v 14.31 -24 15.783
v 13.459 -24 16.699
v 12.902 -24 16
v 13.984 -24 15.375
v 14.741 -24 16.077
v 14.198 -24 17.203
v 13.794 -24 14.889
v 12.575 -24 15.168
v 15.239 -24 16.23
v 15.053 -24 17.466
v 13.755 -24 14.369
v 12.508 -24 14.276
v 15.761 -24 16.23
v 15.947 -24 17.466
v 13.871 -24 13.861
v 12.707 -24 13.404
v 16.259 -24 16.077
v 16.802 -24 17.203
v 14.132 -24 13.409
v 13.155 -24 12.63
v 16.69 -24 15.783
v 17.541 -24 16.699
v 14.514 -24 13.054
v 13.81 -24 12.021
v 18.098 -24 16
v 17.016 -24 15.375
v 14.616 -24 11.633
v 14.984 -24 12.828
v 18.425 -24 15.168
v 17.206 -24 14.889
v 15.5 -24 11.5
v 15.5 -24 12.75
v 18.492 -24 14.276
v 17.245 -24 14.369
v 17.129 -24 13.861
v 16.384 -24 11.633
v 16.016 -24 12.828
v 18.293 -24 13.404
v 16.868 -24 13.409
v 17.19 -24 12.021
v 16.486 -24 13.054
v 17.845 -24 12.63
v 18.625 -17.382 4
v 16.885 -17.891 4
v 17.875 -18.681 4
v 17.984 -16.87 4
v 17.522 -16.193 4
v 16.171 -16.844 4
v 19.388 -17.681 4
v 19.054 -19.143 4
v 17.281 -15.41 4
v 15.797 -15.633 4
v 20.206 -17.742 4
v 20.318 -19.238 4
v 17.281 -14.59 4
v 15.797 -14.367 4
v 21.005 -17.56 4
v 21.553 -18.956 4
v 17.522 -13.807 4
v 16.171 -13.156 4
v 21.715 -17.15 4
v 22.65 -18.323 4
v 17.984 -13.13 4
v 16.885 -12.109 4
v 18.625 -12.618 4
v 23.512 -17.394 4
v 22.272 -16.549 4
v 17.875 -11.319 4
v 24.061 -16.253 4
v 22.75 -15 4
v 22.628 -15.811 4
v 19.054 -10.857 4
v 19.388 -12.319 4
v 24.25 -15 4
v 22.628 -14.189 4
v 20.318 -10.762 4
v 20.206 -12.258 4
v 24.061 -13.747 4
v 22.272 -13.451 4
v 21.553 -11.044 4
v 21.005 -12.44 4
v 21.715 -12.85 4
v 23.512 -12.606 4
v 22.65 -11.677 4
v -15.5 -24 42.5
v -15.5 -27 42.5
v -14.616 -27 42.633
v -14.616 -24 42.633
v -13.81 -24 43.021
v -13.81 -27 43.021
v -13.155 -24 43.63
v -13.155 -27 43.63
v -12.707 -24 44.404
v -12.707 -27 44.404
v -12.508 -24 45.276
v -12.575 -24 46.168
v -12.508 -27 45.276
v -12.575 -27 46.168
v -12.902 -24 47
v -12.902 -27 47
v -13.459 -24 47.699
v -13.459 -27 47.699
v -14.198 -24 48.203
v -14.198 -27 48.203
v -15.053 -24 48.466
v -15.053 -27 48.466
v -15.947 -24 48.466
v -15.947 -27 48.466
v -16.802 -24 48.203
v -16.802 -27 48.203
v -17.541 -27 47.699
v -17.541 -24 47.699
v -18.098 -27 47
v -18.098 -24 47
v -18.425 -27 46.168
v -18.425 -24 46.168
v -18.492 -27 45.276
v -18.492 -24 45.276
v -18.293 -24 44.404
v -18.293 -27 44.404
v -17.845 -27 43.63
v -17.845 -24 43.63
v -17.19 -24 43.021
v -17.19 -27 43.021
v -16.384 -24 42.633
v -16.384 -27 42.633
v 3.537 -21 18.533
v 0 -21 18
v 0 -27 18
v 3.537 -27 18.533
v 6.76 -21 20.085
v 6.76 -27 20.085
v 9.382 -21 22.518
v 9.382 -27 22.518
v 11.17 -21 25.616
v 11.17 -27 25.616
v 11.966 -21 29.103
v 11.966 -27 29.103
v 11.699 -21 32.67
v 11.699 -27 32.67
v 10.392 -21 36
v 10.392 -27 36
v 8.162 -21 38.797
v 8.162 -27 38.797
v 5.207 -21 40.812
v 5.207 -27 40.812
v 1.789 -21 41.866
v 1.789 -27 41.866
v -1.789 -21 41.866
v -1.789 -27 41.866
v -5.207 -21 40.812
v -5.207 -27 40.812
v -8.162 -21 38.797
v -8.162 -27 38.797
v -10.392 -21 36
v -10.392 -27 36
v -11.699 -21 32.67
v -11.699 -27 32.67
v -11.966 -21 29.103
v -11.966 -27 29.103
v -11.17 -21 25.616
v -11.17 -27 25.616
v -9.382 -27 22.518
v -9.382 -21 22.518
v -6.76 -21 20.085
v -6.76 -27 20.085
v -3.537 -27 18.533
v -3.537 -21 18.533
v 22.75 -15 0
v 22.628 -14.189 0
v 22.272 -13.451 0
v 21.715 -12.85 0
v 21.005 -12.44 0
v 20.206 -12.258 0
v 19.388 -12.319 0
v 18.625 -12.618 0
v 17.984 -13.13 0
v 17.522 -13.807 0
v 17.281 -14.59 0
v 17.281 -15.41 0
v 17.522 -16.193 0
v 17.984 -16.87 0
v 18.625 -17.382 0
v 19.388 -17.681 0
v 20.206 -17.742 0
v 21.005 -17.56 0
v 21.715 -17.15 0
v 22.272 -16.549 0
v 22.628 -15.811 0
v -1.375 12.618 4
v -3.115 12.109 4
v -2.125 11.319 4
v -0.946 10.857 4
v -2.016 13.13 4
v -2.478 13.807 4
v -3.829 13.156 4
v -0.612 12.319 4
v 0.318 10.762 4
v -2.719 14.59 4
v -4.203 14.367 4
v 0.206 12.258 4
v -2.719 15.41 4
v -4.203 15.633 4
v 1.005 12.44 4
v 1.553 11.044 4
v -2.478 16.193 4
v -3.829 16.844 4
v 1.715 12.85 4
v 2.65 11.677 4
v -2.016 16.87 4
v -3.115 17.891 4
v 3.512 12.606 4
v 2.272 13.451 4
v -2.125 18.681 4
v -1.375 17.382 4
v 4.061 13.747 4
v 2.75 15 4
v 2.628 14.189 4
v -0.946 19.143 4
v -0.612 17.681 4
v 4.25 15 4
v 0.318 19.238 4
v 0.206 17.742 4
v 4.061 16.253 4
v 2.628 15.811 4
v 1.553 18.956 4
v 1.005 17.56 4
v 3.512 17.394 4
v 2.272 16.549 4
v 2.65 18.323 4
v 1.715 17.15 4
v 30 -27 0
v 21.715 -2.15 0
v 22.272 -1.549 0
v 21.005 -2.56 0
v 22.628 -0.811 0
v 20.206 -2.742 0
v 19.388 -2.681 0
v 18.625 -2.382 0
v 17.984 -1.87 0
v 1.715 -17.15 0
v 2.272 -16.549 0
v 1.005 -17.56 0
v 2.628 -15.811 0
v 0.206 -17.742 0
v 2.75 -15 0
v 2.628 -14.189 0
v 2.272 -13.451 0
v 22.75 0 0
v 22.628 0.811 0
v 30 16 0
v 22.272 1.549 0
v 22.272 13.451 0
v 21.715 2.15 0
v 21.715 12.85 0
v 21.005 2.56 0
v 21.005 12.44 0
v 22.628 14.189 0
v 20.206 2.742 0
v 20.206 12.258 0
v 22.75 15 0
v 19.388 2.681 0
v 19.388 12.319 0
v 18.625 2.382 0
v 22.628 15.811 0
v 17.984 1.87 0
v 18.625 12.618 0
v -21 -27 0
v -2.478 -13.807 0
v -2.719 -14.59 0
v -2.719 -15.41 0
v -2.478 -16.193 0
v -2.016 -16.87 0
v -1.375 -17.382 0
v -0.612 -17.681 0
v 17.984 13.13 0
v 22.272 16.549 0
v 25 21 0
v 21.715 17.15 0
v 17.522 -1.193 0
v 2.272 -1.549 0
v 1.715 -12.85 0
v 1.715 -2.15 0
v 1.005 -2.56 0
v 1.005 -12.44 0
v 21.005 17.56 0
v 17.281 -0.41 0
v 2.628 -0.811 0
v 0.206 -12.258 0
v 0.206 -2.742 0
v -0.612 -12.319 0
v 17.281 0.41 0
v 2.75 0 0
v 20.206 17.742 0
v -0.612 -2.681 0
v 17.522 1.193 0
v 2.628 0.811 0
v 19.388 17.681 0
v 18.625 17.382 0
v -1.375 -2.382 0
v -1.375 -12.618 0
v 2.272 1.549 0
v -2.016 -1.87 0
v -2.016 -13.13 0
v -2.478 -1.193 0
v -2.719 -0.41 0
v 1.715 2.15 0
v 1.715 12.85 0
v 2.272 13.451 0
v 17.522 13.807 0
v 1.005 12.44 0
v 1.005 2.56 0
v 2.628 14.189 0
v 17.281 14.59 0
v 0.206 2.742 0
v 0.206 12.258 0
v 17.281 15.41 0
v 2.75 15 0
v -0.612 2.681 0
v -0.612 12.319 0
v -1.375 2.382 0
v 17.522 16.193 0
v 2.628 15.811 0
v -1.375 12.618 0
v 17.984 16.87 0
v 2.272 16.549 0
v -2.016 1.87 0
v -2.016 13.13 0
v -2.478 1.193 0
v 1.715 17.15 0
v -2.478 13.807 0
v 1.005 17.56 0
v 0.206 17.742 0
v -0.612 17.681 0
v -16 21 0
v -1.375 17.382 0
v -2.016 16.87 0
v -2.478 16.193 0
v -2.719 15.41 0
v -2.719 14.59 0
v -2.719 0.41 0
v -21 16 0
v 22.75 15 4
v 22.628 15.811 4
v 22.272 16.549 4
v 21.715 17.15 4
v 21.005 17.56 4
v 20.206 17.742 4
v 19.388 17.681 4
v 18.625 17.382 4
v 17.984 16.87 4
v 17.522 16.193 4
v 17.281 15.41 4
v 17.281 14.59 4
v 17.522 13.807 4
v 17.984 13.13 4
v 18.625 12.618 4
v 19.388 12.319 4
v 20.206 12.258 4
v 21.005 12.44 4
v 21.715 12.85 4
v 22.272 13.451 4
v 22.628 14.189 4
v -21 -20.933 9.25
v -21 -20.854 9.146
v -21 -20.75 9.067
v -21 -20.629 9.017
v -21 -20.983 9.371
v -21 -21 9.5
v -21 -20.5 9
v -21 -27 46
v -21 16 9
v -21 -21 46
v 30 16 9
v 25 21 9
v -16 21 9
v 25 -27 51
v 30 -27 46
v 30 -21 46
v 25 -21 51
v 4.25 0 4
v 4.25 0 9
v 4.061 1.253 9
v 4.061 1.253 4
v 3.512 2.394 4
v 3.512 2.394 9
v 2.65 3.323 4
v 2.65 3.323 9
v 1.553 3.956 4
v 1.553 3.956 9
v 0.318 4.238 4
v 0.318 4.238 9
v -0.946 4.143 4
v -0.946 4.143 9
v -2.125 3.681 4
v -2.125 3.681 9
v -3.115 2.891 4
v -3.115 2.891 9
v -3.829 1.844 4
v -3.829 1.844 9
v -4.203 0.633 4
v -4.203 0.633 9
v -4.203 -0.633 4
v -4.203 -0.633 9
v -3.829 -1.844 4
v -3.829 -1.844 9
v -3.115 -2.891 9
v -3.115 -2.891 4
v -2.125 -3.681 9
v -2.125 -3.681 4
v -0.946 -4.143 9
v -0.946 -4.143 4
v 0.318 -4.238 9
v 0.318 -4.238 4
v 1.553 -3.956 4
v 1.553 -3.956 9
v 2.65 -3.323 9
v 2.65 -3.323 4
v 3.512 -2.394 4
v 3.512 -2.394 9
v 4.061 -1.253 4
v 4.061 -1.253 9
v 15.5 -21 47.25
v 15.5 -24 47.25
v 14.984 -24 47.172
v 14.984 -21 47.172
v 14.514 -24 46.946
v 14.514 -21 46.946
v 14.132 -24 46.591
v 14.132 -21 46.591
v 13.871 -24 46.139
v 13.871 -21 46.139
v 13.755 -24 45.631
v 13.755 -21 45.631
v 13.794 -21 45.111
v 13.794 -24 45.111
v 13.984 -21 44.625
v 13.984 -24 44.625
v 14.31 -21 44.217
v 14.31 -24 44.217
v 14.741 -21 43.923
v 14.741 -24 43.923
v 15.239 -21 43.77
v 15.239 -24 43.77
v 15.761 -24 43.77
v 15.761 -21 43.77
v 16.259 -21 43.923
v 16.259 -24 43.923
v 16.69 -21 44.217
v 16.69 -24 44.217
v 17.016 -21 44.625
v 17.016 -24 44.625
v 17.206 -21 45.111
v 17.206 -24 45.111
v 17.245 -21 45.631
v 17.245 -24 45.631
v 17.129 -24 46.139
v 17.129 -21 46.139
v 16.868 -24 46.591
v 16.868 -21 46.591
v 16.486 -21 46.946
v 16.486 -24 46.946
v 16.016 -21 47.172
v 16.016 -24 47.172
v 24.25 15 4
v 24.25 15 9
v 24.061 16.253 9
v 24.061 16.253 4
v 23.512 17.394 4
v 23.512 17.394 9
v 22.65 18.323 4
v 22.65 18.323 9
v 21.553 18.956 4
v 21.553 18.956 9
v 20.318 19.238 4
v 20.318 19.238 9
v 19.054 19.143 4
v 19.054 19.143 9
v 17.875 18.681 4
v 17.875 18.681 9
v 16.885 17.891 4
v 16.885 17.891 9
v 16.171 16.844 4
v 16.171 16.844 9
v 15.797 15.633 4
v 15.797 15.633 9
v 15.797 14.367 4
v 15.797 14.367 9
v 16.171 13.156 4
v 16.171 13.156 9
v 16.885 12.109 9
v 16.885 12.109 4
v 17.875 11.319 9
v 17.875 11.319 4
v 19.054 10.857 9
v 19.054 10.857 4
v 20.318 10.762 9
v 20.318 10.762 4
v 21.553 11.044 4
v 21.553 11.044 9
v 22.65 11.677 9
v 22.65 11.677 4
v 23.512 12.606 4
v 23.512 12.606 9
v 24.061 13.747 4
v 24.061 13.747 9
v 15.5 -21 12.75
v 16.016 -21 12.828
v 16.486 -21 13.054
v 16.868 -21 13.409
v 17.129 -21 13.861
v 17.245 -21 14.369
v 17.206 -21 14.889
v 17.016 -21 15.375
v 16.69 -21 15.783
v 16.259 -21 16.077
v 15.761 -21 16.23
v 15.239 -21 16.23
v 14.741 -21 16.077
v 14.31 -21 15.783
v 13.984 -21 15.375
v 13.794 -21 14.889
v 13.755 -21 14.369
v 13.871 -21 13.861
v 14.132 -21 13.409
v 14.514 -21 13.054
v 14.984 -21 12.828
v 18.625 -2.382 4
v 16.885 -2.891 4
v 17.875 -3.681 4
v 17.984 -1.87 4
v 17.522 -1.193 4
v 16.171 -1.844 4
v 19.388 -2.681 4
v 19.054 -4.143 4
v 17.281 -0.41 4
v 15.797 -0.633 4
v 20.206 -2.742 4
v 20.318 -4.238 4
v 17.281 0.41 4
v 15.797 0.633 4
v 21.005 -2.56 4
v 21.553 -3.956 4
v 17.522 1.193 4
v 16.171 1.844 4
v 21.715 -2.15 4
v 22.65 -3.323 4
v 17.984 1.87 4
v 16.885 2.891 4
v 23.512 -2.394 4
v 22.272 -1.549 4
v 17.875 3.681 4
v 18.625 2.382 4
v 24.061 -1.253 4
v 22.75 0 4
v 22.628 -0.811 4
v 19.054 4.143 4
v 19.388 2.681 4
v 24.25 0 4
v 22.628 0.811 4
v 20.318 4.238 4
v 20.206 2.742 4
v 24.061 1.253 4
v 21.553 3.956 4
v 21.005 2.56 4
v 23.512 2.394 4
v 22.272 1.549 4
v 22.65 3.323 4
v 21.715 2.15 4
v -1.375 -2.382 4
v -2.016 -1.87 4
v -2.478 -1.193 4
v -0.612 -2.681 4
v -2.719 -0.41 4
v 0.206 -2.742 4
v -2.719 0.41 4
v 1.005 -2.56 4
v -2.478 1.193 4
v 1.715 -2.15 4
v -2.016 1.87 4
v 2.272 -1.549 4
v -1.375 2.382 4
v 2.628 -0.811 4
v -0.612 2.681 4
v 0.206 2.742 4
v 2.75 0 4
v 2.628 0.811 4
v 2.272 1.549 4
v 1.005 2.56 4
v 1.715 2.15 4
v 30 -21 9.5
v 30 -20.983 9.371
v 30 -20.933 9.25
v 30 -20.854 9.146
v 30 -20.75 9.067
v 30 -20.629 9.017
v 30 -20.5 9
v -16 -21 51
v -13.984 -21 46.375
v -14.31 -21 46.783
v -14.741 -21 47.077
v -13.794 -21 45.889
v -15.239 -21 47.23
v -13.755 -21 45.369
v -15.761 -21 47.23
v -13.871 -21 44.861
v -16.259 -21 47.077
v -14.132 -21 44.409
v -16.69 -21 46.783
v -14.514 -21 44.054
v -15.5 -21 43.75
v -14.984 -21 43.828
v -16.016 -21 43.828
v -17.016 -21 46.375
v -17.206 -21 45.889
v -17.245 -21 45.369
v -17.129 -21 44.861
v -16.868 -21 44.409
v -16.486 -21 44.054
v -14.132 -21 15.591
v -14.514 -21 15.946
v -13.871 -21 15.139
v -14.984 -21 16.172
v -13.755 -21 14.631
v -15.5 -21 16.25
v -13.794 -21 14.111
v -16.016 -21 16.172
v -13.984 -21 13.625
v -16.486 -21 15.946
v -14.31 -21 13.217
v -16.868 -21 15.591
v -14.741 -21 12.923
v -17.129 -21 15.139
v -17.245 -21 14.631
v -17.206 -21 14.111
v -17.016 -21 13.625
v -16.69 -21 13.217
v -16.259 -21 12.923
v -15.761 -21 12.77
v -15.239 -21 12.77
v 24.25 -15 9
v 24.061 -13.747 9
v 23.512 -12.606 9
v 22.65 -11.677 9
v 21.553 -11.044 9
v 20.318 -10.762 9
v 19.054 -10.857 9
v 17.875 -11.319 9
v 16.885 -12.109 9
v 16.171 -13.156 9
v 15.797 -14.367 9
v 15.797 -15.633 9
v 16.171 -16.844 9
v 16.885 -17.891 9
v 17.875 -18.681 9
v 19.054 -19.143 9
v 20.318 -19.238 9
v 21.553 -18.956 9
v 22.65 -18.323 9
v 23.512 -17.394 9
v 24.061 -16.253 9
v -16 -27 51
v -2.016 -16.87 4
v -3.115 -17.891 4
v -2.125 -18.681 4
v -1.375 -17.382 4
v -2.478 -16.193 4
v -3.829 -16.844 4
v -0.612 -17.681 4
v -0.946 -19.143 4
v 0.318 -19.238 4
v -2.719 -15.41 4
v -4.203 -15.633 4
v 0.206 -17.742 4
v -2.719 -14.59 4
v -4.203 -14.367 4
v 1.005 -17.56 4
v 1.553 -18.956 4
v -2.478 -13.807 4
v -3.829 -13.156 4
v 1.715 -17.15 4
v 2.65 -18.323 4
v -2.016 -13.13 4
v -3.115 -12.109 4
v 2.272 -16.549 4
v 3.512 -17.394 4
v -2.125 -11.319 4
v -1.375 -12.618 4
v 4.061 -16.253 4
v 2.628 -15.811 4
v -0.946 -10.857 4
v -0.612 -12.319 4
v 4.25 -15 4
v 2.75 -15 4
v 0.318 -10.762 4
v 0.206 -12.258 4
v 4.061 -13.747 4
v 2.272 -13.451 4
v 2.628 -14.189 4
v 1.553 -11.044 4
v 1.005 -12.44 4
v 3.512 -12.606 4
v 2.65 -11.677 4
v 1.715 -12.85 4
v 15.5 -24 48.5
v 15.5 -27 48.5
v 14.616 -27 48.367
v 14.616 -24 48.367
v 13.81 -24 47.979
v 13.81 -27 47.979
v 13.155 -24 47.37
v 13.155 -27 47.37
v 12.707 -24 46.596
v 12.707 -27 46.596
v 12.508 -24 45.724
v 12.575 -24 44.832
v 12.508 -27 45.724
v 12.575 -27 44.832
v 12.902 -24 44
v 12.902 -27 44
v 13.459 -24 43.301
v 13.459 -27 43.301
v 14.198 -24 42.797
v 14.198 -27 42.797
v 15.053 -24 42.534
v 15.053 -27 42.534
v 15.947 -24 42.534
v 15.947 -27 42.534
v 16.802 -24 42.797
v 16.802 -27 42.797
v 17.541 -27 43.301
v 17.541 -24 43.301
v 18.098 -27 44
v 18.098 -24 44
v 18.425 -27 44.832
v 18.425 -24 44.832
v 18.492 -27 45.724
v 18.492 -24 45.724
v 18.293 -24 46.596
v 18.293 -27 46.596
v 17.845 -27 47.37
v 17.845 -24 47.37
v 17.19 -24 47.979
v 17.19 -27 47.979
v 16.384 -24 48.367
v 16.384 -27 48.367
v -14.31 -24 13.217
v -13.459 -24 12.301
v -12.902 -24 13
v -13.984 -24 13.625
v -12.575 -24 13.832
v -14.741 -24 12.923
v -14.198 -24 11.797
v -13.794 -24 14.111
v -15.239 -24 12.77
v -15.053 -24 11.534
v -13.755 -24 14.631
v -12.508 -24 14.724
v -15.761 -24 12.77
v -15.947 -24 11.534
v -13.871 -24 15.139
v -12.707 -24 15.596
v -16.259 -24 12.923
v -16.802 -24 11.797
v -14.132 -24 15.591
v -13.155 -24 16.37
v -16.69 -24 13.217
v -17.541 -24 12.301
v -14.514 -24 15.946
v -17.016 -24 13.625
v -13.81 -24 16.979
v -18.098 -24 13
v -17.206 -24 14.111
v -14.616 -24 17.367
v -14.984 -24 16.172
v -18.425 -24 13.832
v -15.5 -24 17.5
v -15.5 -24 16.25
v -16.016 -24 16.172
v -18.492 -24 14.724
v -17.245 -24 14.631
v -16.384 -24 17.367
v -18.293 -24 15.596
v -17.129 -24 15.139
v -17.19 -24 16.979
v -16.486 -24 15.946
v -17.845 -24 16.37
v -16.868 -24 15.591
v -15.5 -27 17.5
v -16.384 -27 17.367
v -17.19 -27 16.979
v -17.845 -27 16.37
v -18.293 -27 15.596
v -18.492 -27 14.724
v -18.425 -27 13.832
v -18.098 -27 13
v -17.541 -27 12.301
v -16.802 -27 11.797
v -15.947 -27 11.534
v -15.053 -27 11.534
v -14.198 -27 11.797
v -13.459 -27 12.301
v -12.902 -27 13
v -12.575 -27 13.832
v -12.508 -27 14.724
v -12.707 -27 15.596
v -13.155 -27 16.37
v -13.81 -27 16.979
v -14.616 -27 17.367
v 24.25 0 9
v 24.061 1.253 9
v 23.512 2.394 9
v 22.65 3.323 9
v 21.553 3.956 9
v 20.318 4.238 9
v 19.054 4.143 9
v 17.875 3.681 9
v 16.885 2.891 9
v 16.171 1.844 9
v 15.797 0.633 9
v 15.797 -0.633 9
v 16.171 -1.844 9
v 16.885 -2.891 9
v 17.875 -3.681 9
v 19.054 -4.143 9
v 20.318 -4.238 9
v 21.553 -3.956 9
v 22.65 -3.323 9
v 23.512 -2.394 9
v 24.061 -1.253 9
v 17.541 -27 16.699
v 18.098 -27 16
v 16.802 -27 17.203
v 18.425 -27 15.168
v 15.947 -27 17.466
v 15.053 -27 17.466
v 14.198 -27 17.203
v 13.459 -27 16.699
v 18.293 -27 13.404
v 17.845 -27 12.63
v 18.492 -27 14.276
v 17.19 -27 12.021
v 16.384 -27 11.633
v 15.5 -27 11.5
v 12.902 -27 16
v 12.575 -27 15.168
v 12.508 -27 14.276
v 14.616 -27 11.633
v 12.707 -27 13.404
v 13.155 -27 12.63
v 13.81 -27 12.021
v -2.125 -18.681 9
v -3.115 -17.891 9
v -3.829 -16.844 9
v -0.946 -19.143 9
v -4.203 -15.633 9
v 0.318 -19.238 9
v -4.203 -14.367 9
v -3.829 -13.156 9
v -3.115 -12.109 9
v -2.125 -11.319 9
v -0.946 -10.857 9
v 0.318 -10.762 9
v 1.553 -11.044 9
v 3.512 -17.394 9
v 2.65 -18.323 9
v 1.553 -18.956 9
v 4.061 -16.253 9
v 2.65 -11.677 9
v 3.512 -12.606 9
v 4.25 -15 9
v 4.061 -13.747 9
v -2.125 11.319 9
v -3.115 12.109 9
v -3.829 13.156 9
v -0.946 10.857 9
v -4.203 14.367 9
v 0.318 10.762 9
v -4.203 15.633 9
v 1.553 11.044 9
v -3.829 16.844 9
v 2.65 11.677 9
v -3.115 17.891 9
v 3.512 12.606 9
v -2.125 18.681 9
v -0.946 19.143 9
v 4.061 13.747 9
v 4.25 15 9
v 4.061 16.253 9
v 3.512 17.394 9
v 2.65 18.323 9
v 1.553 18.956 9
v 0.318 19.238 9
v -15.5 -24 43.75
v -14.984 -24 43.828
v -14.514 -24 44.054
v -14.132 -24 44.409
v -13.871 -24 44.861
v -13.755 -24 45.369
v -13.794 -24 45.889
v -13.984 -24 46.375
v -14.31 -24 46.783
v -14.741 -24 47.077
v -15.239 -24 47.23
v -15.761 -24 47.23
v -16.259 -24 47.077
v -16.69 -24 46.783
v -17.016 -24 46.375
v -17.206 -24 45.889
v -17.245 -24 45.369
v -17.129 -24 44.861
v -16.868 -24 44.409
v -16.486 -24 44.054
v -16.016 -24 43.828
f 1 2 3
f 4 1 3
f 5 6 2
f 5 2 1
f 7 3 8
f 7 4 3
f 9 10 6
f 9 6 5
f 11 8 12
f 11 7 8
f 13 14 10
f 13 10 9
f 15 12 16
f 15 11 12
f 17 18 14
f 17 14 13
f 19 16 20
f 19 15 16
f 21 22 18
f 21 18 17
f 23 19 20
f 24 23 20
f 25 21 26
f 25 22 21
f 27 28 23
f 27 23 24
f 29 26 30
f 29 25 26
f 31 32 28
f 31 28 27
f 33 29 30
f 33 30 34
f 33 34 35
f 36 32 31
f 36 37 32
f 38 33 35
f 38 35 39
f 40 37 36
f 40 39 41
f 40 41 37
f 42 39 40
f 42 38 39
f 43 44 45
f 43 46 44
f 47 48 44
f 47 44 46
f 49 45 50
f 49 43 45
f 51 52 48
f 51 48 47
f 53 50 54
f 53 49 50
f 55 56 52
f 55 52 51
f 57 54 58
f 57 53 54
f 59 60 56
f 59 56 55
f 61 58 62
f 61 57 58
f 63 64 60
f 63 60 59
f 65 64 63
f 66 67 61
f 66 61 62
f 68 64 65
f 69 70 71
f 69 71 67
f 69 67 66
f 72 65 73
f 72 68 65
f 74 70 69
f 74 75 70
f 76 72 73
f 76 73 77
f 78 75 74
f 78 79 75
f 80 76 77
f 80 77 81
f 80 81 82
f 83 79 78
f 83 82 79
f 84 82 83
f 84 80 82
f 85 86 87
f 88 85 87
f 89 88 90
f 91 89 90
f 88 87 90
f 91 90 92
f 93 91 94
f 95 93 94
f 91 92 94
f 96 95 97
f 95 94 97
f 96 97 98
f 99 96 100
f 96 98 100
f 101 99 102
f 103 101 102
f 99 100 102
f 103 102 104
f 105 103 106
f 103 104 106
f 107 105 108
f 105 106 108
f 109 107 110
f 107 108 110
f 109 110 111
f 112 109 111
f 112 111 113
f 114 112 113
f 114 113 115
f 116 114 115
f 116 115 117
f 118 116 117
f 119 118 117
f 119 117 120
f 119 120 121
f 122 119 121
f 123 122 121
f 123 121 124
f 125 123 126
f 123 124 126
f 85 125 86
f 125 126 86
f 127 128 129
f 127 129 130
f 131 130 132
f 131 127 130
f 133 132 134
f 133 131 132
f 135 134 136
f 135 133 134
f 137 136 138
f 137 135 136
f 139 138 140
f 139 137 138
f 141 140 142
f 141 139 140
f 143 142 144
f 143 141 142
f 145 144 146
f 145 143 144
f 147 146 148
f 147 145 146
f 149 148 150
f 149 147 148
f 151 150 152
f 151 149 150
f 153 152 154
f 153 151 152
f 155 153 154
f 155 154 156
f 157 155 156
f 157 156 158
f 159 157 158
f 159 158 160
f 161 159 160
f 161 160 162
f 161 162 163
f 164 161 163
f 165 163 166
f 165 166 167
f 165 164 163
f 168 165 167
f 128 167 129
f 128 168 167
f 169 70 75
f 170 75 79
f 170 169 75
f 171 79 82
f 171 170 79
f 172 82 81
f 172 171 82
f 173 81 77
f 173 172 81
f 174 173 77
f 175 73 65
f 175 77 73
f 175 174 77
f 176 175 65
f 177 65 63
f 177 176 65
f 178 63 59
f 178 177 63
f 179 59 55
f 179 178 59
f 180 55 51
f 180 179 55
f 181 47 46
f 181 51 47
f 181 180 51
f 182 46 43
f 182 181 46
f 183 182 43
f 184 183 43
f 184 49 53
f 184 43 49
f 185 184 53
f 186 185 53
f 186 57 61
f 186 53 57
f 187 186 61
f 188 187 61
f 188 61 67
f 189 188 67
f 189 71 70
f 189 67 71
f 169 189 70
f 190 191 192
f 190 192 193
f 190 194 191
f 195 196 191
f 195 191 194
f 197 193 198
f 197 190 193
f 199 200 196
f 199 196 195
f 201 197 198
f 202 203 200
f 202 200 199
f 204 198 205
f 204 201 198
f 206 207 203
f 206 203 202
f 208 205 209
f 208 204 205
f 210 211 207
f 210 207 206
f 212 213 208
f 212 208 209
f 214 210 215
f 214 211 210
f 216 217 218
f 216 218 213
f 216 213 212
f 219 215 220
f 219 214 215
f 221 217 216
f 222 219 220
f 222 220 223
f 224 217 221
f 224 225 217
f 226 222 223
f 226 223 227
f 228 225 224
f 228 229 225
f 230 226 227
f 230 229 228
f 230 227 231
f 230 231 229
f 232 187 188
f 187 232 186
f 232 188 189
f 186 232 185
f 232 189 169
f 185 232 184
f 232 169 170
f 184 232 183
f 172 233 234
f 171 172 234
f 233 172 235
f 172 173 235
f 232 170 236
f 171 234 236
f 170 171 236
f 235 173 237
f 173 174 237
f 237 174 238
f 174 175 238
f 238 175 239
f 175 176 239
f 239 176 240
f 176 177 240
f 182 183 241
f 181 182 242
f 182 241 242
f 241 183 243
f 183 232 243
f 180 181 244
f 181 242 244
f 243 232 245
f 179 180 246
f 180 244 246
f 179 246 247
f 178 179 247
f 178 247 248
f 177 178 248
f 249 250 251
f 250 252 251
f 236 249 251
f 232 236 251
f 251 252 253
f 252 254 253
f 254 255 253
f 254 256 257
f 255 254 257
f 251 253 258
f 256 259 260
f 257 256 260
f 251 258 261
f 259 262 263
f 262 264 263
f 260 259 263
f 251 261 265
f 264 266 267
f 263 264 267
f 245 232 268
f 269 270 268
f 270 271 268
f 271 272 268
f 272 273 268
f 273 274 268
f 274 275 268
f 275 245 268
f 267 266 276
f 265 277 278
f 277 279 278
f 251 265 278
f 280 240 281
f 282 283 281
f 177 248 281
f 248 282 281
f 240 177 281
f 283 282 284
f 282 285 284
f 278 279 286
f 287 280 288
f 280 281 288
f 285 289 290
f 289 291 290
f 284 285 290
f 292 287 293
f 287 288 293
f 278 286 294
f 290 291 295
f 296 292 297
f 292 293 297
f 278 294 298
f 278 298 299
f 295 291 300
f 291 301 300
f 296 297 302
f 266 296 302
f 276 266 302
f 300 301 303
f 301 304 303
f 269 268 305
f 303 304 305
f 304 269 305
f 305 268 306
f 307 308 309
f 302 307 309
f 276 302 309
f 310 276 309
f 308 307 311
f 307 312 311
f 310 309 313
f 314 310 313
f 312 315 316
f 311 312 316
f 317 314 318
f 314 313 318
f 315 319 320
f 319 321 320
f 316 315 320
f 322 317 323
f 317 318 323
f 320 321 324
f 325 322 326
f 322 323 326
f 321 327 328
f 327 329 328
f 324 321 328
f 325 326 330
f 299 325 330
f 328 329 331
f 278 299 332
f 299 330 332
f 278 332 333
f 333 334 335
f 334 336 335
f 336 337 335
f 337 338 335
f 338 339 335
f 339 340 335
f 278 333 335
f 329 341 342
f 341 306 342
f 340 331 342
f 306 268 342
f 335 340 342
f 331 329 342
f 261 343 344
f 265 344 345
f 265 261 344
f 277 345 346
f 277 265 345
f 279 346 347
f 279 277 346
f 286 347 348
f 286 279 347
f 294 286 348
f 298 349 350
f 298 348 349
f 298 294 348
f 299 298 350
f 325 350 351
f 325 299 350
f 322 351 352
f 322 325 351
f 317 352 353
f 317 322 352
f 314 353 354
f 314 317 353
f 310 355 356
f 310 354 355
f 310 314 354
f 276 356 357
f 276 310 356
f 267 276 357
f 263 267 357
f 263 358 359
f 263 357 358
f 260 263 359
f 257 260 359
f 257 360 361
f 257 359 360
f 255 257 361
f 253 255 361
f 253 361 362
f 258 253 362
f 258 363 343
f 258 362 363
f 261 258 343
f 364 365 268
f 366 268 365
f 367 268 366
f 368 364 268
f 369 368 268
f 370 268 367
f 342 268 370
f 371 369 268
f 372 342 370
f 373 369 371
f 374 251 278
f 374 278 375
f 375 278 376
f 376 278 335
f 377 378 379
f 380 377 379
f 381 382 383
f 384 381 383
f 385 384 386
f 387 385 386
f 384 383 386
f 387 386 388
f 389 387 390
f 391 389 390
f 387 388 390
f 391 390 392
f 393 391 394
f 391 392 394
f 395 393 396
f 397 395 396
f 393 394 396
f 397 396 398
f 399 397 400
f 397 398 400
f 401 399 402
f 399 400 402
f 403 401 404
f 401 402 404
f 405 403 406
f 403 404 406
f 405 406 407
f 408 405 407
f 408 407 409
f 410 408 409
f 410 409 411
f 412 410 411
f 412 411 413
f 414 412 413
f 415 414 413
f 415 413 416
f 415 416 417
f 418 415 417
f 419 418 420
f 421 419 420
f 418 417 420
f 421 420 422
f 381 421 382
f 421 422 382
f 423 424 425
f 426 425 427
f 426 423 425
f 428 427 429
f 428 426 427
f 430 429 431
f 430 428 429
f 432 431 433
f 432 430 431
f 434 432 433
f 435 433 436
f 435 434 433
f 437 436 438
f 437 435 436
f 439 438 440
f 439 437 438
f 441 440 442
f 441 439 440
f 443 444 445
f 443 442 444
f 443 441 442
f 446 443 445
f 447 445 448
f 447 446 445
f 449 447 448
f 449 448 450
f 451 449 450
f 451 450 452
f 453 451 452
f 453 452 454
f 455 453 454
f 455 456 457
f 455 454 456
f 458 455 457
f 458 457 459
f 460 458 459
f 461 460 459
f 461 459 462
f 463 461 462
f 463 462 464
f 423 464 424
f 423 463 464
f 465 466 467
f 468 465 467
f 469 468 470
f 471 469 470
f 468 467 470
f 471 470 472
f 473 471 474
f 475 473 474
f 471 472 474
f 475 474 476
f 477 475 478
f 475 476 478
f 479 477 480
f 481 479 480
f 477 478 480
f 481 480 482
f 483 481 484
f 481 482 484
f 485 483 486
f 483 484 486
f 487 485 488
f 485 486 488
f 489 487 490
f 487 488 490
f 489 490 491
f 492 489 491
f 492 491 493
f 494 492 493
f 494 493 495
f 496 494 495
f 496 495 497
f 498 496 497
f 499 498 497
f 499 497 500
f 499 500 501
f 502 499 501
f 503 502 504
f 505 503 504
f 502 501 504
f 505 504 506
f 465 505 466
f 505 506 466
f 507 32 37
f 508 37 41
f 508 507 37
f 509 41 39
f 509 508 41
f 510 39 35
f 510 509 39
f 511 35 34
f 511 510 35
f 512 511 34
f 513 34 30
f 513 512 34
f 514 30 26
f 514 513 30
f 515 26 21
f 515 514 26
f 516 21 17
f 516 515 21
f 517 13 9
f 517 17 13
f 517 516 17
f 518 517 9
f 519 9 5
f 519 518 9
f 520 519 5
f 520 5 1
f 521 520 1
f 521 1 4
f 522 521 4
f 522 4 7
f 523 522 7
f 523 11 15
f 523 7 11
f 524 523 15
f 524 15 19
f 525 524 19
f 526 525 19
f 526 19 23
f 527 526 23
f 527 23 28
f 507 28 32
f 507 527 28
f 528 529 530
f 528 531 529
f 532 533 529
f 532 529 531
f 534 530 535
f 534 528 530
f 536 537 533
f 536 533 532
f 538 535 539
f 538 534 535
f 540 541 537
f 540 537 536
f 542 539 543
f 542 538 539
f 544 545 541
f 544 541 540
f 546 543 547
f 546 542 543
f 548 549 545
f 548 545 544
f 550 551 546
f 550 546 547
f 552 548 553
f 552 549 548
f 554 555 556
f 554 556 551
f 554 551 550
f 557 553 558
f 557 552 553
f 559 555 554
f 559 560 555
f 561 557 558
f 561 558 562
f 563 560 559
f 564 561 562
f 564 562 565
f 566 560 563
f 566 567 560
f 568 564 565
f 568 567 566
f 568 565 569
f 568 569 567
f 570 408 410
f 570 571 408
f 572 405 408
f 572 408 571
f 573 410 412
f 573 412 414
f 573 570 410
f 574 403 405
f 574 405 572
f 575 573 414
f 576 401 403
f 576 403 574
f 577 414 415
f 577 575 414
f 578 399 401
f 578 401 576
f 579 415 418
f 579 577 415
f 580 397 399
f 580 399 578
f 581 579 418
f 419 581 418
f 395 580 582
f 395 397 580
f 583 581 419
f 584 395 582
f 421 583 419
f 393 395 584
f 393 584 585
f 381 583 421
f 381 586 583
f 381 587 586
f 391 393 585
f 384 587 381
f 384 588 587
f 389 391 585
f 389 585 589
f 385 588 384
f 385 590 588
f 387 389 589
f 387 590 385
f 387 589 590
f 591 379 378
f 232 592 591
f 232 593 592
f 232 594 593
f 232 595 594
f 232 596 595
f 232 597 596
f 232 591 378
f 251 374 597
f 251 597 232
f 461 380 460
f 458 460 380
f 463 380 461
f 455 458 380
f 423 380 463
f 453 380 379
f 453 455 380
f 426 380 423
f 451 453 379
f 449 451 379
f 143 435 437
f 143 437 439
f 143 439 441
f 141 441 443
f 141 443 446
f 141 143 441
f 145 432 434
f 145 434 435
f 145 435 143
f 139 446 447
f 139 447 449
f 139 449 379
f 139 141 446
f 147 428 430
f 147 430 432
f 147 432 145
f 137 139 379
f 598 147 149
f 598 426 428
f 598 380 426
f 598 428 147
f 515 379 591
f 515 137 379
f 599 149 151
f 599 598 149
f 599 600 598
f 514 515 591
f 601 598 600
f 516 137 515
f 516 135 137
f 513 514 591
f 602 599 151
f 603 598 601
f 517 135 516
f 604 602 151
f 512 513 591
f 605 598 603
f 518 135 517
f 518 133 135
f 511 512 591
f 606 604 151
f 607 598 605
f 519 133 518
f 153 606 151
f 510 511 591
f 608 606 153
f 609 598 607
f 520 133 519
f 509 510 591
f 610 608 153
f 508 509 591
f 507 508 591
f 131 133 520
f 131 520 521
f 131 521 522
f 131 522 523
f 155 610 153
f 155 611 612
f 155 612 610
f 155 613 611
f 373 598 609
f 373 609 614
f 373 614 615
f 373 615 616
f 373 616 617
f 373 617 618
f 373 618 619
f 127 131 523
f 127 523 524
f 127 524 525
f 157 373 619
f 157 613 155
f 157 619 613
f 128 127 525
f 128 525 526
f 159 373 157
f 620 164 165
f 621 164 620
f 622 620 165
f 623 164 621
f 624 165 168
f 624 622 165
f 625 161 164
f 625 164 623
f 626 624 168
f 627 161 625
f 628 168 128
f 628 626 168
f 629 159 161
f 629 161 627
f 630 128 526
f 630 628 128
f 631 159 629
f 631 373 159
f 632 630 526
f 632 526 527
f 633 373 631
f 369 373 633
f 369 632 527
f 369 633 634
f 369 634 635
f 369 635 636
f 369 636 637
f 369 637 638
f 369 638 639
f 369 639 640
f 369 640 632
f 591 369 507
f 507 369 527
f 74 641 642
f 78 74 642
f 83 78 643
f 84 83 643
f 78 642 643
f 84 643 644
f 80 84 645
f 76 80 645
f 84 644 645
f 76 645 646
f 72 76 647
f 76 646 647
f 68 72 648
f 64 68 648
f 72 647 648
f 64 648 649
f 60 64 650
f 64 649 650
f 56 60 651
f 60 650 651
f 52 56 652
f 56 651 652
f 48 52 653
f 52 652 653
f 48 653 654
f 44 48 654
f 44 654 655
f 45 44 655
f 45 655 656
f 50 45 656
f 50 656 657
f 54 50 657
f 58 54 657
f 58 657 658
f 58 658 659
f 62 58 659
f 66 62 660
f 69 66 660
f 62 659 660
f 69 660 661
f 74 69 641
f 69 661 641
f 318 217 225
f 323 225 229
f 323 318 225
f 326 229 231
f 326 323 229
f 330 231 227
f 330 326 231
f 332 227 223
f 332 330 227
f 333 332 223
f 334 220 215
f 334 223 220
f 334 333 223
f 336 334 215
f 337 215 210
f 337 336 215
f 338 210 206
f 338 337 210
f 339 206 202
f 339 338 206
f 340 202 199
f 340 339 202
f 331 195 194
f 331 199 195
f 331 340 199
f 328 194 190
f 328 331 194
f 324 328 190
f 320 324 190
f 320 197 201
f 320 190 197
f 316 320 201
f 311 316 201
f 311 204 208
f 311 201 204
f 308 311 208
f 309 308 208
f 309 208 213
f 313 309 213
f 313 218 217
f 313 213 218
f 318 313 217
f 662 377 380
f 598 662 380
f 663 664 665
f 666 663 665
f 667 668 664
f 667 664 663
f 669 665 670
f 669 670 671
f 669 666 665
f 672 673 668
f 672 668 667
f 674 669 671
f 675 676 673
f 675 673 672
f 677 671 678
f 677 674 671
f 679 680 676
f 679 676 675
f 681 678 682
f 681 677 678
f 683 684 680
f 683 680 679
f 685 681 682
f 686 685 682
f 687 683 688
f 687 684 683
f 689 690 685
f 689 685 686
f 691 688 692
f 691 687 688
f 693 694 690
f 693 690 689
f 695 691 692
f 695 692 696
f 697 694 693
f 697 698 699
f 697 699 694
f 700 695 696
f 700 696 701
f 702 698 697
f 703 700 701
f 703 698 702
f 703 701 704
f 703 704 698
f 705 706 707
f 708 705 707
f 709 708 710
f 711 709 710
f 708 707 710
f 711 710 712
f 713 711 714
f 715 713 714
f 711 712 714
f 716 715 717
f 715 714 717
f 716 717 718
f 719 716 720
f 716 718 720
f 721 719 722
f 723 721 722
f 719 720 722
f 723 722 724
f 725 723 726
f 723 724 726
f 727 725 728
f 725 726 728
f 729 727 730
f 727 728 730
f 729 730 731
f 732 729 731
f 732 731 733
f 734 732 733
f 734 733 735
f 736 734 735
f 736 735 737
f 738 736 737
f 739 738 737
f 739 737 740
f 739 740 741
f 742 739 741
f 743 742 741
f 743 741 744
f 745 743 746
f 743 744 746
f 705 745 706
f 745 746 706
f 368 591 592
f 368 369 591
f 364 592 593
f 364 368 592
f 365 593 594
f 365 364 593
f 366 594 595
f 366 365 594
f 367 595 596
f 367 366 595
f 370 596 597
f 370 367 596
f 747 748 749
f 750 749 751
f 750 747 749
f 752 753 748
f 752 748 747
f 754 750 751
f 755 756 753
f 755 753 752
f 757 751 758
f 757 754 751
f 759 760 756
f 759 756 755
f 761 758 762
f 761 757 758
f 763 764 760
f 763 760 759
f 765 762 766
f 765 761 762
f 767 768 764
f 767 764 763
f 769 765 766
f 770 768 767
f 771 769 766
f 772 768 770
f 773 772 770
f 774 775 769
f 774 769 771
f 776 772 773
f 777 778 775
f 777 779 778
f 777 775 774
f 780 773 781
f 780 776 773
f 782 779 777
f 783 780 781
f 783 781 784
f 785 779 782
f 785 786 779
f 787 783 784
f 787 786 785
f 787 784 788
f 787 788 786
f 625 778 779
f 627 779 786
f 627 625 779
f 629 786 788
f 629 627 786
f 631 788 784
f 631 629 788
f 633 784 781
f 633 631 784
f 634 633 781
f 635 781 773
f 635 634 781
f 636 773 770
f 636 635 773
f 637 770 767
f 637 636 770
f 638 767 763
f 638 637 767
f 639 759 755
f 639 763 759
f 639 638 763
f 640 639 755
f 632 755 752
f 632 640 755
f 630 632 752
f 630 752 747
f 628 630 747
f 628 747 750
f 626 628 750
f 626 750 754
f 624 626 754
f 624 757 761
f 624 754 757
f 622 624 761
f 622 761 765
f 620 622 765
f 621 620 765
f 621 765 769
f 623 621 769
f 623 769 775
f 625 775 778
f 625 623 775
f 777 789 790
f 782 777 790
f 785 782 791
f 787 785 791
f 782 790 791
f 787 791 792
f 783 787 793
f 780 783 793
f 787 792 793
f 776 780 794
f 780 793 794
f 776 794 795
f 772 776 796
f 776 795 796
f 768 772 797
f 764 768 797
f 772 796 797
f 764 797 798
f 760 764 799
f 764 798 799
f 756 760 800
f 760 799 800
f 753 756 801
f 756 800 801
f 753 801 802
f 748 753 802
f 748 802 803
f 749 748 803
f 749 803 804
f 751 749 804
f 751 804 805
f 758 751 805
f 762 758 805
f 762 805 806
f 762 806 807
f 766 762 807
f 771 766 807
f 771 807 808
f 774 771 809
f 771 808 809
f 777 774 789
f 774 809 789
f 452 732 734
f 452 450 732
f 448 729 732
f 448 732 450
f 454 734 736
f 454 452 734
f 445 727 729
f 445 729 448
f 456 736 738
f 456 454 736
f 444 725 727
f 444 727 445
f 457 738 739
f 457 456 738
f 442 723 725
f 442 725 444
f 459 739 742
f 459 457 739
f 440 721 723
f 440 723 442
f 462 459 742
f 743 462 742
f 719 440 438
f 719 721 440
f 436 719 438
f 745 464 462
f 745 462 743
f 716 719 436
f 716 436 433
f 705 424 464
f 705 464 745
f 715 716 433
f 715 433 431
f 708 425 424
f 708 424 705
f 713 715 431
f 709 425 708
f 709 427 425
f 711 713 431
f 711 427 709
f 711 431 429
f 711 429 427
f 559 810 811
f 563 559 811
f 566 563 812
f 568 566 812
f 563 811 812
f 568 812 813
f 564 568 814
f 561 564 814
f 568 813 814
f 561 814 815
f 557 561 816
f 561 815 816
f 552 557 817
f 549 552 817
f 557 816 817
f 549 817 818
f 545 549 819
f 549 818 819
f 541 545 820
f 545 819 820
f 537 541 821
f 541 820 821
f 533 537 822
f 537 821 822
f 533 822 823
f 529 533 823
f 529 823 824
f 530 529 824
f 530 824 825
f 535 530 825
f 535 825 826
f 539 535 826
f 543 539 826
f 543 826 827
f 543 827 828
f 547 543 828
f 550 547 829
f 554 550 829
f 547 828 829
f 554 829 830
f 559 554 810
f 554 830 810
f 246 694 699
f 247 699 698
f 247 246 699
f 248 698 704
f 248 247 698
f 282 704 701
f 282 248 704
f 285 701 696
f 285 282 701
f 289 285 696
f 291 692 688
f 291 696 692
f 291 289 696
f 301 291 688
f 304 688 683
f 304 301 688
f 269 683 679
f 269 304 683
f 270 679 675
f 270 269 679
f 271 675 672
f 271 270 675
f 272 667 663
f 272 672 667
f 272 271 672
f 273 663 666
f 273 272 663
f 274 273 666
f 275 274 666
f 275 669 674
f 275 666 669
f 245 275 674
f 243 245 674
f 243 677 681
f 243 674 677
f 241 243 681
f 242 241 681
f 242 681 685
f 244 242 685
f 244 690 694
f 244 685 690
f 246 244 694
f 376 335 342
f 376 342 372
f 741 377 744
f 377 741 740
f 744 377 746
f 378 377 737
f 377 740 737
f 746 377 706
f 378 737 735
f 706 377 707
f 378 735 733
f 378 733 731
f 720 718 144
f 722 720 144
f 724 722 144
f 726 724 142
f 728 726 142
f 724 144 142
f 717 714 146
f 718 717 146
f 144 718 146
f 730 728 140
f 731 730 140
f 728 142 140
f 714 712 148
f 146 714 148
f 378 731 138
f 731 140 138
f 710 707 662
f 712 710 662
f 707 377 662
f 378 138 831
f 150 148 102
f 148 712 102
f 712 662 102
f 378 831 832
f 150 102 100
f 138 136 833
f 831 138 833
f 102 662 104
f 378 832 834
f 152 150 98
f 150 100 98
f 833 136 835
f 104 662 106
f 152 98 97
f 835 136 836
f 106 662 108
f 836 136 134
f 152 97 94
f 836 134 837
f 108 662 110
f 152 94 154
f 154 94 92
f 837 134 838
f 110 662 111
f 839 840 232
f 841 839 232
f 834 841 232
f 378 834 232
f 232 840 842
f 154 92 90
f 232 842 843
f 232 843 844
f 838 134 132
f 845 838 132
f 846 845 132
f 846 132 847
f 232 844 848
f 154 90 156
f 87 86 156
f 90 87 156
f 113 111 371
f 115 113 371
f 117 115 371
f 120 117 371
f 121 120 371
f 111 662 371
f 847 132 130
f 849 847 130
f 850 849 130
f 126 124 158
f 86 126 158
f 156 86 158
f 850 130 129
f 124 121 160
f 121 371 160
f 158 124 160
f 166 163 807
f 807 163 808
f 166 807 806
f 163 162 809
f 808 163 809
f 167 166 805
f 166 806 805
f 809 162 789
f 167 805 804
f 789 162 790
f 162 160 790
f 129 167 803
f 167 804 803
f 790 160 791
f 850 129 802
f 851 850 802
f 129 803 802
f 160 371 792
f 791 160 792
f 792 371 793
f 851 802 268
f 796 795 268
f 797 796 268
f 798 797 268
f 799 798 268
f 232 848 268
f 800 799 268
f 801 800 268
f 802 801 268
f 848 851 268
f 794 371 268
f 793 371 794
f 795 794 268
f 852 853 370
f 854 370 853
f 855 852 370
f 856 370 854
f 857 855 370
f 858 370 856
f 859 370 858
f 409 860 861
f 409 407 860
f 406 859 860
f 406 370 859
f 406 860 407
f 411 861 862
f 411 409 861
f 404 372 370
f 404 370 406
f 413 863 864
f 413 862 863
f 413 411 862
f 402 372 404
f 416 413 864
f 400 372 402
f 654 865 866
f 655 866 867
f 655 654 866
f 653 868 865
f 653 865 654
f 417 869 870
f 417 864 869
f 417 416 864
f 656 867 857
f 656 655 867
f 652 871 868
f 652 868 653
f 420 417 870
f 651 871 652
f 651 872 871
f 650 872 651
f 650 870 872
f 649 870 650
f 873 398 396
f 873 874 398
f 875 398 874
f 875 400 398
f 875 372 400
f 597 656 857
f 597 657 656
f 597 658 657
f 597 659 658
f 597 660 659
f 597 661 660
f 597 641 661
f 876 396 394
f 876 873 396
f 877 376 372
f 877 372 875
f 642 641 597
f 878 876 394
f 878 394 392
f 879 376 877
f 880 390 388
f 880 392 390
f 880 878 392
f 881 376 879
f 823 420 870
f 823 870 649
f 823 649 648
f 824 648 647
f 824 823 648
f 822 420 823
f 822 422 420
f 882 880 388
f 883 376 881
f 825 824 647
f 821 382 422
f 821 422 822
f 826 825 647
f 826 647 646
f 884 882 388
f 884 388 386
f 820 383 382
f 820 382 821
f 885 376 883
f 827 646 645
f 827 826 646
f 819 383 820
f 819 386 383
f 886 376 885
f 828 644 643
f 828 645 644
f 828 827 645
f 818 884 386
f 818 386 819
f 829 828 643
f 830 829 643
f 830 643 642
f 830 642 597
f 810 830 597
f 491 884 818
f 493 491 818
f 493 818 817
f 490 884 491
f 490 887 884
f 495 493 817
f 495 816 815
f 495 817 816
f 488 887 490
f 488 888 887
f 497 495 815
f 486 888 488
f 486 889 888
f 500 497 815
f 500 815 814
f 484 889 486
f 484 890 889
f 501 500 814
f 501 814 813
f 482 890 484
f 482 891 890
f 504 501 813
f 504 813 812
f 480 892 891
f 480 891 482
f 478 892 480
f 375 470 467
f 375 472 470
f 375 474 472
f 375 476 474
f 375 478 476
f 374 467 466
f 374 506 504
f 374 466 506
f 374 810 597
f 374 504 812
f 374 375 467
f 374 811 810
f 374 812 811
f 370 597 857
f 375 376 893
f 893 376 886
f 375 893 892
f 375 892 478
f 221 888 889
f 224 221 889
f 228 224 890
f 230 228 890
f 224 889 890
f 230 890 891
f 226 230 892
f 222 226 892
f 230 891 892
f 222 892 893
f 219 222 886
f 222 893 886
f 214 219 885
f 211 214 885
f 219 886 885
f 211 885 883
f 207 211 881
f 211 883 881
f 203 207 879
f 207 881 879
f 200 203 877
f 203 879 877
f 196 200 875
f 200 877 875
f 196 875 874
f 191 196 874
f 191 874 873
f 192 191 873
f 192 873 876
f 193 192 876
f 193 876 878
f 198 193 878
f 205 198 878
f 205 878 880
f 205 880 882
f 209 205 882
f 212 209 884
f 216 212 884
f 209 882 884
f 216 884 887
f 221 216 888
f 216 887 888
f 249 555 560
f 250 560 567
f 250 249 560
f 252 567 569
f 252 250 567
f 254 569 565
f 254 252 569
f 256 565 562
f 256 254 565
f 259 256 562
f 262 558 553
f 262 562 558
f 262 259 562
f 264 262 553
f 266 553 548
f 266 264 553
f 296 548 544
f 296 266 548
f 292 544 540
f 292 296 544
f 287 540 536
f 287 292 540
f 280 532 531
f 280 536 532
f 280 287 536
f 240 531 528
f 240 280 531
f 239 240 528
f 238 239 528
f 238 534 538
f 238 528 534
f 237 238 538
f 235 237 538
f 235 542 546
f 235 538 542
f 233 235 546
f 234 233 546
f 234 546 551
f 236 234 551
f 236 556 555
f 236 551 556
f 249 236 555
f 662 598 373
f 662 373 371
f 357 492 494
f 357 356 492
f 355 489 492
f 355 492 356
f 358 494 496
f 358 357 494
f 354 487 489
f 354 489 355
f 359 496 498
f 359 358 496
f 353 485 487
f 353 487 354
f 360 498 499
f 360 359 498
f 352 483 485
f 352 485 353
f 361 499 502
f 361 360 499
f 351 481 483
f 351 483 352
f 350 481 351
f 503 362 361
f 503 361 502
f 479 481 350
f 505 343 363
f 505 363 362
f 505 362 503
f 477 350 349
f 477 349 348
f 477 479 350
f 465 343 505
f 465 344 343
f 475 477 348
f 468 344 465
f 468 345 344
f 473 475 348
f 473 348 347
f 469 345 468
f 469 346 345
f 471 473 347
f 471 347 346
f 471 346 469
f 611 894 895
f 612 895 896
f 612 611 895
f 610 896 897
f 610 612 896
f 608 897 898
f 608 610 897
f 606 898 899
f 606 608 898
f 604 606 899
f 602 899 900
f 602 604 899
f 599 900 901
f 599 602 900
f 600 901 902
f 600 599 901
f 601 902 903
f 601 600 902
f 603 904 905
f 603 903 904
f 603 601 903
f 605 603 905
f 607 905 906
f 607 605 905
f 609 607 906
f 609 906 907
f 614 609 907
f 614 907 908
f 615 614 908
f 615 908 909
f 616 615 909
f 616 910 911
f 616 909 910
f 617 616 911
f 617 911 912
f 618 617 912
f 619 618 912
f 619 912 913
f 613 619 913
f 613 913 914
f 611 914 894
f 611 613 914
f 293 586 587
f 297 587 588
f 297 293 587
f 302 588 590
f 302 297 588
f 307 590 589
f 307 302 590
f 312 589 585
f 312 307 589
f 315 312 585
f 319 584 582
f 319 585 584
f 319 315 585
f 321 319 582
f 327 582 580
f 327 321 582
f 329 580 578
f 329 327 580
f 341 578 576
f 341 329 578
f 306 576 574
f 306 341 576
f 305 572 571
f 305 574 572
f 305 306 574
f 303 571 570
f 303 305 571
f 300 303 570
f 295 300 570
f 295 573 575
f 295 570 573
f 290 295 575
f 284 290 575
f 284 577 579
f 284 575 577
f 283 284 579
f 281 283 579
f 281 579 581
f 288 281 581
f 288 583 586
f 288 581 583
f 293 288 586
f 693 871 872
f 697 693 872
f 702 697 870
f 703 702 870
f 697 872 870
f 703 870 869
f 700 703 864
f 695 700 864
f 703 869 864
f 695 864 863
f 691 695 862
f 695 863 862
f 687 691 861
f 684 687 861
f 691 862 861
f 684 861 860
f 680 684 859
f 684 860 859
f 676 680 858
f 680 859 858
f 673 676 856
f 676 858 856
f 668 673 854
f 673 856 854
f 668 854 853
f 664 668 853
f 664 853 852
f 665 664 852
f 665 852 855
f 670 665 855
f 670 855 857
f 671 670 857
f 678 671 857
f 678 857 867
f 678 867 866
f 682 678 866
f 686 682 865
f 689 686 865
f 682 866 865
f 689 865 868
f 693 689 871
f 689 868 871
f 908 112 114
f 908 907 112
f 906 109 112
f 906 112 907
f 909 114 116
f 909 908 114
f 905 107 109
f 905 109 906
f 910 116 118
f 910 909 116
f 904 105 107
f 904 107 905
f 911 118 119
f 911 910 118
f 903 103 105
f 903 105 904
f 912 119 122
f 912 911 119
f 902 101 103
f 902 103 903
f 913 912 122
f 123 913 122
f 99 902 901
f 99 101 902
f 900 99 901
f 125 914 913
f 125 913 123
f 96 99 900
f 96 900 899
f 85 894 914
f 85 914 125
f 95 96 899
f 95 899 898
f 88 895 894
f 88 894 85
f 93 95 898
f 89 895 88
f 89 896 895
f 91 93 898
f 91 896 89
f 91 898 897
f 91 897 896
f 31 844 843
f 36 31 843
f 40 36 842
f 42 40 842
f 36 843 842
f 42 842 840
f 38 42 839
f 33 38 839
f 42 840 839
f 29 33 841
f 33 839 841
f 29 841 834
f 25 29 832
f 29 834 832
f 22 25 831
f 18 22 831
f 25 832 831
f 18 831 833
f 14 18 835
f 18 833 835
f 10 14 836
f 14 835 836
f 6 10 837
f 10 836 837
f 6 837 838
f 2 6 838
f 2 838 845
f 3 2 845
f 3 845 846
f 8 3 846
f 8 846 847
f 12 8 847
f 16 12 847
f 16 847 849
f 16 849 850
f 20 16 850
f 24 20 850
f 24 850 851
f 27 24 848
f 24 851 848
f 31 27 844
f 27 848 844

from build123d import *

# Parameters (mm, degrees)
SKETCH_1_R          = 2.75
EXTRUDE_1_DEPTH     = 9
SKETCH_3_W          = 42
SKETCH_3_H          = 42
SKETCH_3_R          = 1.75
SKETCH_3_R_2        = 12
EXTRUDE_2_DEPTH     = 6
SKETCH_4_R          = 3
CUT_EXTRUDE_2_DEPTH = 3
SKETCH_5_W          = 42
SKETCH_5_H          = 9
EXTRUDE_3_DEPTH     = 6
SKETCH_6_R          = 4.25
CUT_EXTRUDE_3_DEPTH = 5
CHAMFER_2_SIZE      = 5
SKETCH_7_W          = 51
SKETCH_7_H          = 6
EXTRUDE_4_DEPTH     = 9
CHAMFER_3_SIZE      = 5
FILLET_1_R          = 0.5


with BuildPart() as part:
    # 草圖1 → 填料-伸長1 (new body)
    with BuildSketch(Plane.XY):
        Polygon((30, 21), (21, 21), (-21, 21), (-21, -21), (21, -21), (30, -21), align=None)
        with Locations((0, 15)):
            Circle(SKETCH_1_R, mode=Mode.SUBTRACT)
        with Locations((20, 15)):
            Circle(SKETCH_1_R, mode=Mode.SUBTRACT)
        with Locations((20, 0)):
            Circle(SKETCH_1_R, mode=Mode.SUBTRACT)
        with Locations((20, -15)):
            Circle(SKETCH_1_R, mode=Mode.SUBTRACT)
        Circle(SKETCH_1_R, mode=Mode.SUBTRACT)
        with Locations((0, -15)):
            Circle(SKETCH_1_R, mode=Mode.SUBTRACT)
    extrude(amount=EXTRUDE_1_DEPTH)



with BuildPart() as body_2:
    # 草圖3 → 填料-伸長2 (new body)
    with BuildSketch(Plane.XZ.offset(21)):
        with Locations((0, 30)):
            Rectangle(SKETCH_3_W, SKETCH_3_H)
        with Locations(Location((-15.5, 45.5, 0), (0, 0, 270))):
            Circle(SKETCH_3_R, mode=Mode.SUBTRACT)
        with Locations(Location((-15.5, 14.5, 0), (0, 0, 90))):
            Circle(SKETCH_3_R, mode=Mode.SUBTRACT)
        with Locations(Location((15.5, 14.5, 0), (0, 0, 270))):
            Circle(SKETCH_3_R, mode=Mode.SUBTRACT)
        with Locations(Location((15.5, 45.5, 0), (0, 0, 90))):
            Circle(SKETCH_3_R, mode=Mode.SUBTRACT)
        with Locations(Location((0, 30, 0), (0, 0, 270))):
            Circle(SKETCH_3_R_2, mode=Mode.SUBTRACT)
    extrude(amount=EXTRUDE_2_DEPTH)

    # 草圖4 → 除料-伸長2 (cut)
    with BuildSketch(Plane.XZ.offset(27)):
        with Locations(Location((-15.5, 45.5, 0), (0, 0, 270))):
            Circle(SKETCH_4_R)
        with Locations(Location((-15.5, 14.5, 0), (0, 0, 90))):
            Circle(SKETCH_4_R)
        with Locations(Location((15.5, 14.5, 0), (0, 0, 270))):
            Circle(SKETCH_4_R)
        with Locations(Location((15.5, 45.5, 0), (0, 0, 90))):
            Circle(SKETCH_4_R)
    extrude(amount=-CUT_EXTRUDE_2_DEPTH, mode=Mode.SUBTRACT)


with BuildPart() as part_1:
    add(part.part)

    add(body_2.part)  # 填料-伸長3 merges body 2
    # 草圖5 → 填料-伸長3 (add)
    with BuildSketch(Plane.XZ.offset(21)):
        with Locations((0, 4.5)):
            Rectangle(SKETCH_5_W, SKETCH_5_H)
    extrude(amount=EXTRUDE_3_DEPTH)

    # 草圖6 → 除料-伸長3 (cut)
    with BuildSketch(Plane.XY.offset(9)):
        with Locations((0, 15)):
            Circle(SKETCH_6_R)
        with Locations((20, 15)):
            Circle(SKETCH_6_R)
        with Locations((20, 0)):
            Circle(SKETCH_6_R)
        with Locations((20, -15)):
            Circle(SKETCH_6_R)
        Circle(SKETCH_6_R)
        with Locations((0, -15)):
            Circle(SKETCH_6_R)
    extrude(amount=-CUT_EXTRUDE_3_DEPTH, mode=Mode.SUBTRACT)

    # 導角2
    chamfer_2_edges = [part_1.edges().sort_by_distance(p)[0] for p in [
        (-21, 21, 4.5),
        (30, 21, 4.5),
    ]]
    chamfer(chamfer_2_edges, length=CHAMFER_2_SIZE)

    # 草圖7 → 填料-伸長4 (add)
    with BuildSketch(Plane(origin=(21, 0, 0), x_dir=(0, 0, -1), z_dir=(1, 0, 0))):
        with Locations((-25.5, -24)):
            Rectangle(SKETCH_7_W, SKETCH_7_H)
    extrude(amount=EXTRUDE_4_DEPTH)

    # 導角3
    chamfer_3_edges = [part_1.edges().sort_by_distance(p)[0] for p in [
        (30, -24, 51),
        (-21, -24, 51),
    ]]
    chamfer(chamfer_3_edges, length=CHAMFER_3_SIZE)

    # 圓角1
    fillet_1_edges = [part_1.edges().sort_by_distance(p)[0] for p in [
        (4.5, -21, 9),
    ]]
    fillet(fillet_1_edges, radius=FILLET_1_R)


solid = part_1.part
